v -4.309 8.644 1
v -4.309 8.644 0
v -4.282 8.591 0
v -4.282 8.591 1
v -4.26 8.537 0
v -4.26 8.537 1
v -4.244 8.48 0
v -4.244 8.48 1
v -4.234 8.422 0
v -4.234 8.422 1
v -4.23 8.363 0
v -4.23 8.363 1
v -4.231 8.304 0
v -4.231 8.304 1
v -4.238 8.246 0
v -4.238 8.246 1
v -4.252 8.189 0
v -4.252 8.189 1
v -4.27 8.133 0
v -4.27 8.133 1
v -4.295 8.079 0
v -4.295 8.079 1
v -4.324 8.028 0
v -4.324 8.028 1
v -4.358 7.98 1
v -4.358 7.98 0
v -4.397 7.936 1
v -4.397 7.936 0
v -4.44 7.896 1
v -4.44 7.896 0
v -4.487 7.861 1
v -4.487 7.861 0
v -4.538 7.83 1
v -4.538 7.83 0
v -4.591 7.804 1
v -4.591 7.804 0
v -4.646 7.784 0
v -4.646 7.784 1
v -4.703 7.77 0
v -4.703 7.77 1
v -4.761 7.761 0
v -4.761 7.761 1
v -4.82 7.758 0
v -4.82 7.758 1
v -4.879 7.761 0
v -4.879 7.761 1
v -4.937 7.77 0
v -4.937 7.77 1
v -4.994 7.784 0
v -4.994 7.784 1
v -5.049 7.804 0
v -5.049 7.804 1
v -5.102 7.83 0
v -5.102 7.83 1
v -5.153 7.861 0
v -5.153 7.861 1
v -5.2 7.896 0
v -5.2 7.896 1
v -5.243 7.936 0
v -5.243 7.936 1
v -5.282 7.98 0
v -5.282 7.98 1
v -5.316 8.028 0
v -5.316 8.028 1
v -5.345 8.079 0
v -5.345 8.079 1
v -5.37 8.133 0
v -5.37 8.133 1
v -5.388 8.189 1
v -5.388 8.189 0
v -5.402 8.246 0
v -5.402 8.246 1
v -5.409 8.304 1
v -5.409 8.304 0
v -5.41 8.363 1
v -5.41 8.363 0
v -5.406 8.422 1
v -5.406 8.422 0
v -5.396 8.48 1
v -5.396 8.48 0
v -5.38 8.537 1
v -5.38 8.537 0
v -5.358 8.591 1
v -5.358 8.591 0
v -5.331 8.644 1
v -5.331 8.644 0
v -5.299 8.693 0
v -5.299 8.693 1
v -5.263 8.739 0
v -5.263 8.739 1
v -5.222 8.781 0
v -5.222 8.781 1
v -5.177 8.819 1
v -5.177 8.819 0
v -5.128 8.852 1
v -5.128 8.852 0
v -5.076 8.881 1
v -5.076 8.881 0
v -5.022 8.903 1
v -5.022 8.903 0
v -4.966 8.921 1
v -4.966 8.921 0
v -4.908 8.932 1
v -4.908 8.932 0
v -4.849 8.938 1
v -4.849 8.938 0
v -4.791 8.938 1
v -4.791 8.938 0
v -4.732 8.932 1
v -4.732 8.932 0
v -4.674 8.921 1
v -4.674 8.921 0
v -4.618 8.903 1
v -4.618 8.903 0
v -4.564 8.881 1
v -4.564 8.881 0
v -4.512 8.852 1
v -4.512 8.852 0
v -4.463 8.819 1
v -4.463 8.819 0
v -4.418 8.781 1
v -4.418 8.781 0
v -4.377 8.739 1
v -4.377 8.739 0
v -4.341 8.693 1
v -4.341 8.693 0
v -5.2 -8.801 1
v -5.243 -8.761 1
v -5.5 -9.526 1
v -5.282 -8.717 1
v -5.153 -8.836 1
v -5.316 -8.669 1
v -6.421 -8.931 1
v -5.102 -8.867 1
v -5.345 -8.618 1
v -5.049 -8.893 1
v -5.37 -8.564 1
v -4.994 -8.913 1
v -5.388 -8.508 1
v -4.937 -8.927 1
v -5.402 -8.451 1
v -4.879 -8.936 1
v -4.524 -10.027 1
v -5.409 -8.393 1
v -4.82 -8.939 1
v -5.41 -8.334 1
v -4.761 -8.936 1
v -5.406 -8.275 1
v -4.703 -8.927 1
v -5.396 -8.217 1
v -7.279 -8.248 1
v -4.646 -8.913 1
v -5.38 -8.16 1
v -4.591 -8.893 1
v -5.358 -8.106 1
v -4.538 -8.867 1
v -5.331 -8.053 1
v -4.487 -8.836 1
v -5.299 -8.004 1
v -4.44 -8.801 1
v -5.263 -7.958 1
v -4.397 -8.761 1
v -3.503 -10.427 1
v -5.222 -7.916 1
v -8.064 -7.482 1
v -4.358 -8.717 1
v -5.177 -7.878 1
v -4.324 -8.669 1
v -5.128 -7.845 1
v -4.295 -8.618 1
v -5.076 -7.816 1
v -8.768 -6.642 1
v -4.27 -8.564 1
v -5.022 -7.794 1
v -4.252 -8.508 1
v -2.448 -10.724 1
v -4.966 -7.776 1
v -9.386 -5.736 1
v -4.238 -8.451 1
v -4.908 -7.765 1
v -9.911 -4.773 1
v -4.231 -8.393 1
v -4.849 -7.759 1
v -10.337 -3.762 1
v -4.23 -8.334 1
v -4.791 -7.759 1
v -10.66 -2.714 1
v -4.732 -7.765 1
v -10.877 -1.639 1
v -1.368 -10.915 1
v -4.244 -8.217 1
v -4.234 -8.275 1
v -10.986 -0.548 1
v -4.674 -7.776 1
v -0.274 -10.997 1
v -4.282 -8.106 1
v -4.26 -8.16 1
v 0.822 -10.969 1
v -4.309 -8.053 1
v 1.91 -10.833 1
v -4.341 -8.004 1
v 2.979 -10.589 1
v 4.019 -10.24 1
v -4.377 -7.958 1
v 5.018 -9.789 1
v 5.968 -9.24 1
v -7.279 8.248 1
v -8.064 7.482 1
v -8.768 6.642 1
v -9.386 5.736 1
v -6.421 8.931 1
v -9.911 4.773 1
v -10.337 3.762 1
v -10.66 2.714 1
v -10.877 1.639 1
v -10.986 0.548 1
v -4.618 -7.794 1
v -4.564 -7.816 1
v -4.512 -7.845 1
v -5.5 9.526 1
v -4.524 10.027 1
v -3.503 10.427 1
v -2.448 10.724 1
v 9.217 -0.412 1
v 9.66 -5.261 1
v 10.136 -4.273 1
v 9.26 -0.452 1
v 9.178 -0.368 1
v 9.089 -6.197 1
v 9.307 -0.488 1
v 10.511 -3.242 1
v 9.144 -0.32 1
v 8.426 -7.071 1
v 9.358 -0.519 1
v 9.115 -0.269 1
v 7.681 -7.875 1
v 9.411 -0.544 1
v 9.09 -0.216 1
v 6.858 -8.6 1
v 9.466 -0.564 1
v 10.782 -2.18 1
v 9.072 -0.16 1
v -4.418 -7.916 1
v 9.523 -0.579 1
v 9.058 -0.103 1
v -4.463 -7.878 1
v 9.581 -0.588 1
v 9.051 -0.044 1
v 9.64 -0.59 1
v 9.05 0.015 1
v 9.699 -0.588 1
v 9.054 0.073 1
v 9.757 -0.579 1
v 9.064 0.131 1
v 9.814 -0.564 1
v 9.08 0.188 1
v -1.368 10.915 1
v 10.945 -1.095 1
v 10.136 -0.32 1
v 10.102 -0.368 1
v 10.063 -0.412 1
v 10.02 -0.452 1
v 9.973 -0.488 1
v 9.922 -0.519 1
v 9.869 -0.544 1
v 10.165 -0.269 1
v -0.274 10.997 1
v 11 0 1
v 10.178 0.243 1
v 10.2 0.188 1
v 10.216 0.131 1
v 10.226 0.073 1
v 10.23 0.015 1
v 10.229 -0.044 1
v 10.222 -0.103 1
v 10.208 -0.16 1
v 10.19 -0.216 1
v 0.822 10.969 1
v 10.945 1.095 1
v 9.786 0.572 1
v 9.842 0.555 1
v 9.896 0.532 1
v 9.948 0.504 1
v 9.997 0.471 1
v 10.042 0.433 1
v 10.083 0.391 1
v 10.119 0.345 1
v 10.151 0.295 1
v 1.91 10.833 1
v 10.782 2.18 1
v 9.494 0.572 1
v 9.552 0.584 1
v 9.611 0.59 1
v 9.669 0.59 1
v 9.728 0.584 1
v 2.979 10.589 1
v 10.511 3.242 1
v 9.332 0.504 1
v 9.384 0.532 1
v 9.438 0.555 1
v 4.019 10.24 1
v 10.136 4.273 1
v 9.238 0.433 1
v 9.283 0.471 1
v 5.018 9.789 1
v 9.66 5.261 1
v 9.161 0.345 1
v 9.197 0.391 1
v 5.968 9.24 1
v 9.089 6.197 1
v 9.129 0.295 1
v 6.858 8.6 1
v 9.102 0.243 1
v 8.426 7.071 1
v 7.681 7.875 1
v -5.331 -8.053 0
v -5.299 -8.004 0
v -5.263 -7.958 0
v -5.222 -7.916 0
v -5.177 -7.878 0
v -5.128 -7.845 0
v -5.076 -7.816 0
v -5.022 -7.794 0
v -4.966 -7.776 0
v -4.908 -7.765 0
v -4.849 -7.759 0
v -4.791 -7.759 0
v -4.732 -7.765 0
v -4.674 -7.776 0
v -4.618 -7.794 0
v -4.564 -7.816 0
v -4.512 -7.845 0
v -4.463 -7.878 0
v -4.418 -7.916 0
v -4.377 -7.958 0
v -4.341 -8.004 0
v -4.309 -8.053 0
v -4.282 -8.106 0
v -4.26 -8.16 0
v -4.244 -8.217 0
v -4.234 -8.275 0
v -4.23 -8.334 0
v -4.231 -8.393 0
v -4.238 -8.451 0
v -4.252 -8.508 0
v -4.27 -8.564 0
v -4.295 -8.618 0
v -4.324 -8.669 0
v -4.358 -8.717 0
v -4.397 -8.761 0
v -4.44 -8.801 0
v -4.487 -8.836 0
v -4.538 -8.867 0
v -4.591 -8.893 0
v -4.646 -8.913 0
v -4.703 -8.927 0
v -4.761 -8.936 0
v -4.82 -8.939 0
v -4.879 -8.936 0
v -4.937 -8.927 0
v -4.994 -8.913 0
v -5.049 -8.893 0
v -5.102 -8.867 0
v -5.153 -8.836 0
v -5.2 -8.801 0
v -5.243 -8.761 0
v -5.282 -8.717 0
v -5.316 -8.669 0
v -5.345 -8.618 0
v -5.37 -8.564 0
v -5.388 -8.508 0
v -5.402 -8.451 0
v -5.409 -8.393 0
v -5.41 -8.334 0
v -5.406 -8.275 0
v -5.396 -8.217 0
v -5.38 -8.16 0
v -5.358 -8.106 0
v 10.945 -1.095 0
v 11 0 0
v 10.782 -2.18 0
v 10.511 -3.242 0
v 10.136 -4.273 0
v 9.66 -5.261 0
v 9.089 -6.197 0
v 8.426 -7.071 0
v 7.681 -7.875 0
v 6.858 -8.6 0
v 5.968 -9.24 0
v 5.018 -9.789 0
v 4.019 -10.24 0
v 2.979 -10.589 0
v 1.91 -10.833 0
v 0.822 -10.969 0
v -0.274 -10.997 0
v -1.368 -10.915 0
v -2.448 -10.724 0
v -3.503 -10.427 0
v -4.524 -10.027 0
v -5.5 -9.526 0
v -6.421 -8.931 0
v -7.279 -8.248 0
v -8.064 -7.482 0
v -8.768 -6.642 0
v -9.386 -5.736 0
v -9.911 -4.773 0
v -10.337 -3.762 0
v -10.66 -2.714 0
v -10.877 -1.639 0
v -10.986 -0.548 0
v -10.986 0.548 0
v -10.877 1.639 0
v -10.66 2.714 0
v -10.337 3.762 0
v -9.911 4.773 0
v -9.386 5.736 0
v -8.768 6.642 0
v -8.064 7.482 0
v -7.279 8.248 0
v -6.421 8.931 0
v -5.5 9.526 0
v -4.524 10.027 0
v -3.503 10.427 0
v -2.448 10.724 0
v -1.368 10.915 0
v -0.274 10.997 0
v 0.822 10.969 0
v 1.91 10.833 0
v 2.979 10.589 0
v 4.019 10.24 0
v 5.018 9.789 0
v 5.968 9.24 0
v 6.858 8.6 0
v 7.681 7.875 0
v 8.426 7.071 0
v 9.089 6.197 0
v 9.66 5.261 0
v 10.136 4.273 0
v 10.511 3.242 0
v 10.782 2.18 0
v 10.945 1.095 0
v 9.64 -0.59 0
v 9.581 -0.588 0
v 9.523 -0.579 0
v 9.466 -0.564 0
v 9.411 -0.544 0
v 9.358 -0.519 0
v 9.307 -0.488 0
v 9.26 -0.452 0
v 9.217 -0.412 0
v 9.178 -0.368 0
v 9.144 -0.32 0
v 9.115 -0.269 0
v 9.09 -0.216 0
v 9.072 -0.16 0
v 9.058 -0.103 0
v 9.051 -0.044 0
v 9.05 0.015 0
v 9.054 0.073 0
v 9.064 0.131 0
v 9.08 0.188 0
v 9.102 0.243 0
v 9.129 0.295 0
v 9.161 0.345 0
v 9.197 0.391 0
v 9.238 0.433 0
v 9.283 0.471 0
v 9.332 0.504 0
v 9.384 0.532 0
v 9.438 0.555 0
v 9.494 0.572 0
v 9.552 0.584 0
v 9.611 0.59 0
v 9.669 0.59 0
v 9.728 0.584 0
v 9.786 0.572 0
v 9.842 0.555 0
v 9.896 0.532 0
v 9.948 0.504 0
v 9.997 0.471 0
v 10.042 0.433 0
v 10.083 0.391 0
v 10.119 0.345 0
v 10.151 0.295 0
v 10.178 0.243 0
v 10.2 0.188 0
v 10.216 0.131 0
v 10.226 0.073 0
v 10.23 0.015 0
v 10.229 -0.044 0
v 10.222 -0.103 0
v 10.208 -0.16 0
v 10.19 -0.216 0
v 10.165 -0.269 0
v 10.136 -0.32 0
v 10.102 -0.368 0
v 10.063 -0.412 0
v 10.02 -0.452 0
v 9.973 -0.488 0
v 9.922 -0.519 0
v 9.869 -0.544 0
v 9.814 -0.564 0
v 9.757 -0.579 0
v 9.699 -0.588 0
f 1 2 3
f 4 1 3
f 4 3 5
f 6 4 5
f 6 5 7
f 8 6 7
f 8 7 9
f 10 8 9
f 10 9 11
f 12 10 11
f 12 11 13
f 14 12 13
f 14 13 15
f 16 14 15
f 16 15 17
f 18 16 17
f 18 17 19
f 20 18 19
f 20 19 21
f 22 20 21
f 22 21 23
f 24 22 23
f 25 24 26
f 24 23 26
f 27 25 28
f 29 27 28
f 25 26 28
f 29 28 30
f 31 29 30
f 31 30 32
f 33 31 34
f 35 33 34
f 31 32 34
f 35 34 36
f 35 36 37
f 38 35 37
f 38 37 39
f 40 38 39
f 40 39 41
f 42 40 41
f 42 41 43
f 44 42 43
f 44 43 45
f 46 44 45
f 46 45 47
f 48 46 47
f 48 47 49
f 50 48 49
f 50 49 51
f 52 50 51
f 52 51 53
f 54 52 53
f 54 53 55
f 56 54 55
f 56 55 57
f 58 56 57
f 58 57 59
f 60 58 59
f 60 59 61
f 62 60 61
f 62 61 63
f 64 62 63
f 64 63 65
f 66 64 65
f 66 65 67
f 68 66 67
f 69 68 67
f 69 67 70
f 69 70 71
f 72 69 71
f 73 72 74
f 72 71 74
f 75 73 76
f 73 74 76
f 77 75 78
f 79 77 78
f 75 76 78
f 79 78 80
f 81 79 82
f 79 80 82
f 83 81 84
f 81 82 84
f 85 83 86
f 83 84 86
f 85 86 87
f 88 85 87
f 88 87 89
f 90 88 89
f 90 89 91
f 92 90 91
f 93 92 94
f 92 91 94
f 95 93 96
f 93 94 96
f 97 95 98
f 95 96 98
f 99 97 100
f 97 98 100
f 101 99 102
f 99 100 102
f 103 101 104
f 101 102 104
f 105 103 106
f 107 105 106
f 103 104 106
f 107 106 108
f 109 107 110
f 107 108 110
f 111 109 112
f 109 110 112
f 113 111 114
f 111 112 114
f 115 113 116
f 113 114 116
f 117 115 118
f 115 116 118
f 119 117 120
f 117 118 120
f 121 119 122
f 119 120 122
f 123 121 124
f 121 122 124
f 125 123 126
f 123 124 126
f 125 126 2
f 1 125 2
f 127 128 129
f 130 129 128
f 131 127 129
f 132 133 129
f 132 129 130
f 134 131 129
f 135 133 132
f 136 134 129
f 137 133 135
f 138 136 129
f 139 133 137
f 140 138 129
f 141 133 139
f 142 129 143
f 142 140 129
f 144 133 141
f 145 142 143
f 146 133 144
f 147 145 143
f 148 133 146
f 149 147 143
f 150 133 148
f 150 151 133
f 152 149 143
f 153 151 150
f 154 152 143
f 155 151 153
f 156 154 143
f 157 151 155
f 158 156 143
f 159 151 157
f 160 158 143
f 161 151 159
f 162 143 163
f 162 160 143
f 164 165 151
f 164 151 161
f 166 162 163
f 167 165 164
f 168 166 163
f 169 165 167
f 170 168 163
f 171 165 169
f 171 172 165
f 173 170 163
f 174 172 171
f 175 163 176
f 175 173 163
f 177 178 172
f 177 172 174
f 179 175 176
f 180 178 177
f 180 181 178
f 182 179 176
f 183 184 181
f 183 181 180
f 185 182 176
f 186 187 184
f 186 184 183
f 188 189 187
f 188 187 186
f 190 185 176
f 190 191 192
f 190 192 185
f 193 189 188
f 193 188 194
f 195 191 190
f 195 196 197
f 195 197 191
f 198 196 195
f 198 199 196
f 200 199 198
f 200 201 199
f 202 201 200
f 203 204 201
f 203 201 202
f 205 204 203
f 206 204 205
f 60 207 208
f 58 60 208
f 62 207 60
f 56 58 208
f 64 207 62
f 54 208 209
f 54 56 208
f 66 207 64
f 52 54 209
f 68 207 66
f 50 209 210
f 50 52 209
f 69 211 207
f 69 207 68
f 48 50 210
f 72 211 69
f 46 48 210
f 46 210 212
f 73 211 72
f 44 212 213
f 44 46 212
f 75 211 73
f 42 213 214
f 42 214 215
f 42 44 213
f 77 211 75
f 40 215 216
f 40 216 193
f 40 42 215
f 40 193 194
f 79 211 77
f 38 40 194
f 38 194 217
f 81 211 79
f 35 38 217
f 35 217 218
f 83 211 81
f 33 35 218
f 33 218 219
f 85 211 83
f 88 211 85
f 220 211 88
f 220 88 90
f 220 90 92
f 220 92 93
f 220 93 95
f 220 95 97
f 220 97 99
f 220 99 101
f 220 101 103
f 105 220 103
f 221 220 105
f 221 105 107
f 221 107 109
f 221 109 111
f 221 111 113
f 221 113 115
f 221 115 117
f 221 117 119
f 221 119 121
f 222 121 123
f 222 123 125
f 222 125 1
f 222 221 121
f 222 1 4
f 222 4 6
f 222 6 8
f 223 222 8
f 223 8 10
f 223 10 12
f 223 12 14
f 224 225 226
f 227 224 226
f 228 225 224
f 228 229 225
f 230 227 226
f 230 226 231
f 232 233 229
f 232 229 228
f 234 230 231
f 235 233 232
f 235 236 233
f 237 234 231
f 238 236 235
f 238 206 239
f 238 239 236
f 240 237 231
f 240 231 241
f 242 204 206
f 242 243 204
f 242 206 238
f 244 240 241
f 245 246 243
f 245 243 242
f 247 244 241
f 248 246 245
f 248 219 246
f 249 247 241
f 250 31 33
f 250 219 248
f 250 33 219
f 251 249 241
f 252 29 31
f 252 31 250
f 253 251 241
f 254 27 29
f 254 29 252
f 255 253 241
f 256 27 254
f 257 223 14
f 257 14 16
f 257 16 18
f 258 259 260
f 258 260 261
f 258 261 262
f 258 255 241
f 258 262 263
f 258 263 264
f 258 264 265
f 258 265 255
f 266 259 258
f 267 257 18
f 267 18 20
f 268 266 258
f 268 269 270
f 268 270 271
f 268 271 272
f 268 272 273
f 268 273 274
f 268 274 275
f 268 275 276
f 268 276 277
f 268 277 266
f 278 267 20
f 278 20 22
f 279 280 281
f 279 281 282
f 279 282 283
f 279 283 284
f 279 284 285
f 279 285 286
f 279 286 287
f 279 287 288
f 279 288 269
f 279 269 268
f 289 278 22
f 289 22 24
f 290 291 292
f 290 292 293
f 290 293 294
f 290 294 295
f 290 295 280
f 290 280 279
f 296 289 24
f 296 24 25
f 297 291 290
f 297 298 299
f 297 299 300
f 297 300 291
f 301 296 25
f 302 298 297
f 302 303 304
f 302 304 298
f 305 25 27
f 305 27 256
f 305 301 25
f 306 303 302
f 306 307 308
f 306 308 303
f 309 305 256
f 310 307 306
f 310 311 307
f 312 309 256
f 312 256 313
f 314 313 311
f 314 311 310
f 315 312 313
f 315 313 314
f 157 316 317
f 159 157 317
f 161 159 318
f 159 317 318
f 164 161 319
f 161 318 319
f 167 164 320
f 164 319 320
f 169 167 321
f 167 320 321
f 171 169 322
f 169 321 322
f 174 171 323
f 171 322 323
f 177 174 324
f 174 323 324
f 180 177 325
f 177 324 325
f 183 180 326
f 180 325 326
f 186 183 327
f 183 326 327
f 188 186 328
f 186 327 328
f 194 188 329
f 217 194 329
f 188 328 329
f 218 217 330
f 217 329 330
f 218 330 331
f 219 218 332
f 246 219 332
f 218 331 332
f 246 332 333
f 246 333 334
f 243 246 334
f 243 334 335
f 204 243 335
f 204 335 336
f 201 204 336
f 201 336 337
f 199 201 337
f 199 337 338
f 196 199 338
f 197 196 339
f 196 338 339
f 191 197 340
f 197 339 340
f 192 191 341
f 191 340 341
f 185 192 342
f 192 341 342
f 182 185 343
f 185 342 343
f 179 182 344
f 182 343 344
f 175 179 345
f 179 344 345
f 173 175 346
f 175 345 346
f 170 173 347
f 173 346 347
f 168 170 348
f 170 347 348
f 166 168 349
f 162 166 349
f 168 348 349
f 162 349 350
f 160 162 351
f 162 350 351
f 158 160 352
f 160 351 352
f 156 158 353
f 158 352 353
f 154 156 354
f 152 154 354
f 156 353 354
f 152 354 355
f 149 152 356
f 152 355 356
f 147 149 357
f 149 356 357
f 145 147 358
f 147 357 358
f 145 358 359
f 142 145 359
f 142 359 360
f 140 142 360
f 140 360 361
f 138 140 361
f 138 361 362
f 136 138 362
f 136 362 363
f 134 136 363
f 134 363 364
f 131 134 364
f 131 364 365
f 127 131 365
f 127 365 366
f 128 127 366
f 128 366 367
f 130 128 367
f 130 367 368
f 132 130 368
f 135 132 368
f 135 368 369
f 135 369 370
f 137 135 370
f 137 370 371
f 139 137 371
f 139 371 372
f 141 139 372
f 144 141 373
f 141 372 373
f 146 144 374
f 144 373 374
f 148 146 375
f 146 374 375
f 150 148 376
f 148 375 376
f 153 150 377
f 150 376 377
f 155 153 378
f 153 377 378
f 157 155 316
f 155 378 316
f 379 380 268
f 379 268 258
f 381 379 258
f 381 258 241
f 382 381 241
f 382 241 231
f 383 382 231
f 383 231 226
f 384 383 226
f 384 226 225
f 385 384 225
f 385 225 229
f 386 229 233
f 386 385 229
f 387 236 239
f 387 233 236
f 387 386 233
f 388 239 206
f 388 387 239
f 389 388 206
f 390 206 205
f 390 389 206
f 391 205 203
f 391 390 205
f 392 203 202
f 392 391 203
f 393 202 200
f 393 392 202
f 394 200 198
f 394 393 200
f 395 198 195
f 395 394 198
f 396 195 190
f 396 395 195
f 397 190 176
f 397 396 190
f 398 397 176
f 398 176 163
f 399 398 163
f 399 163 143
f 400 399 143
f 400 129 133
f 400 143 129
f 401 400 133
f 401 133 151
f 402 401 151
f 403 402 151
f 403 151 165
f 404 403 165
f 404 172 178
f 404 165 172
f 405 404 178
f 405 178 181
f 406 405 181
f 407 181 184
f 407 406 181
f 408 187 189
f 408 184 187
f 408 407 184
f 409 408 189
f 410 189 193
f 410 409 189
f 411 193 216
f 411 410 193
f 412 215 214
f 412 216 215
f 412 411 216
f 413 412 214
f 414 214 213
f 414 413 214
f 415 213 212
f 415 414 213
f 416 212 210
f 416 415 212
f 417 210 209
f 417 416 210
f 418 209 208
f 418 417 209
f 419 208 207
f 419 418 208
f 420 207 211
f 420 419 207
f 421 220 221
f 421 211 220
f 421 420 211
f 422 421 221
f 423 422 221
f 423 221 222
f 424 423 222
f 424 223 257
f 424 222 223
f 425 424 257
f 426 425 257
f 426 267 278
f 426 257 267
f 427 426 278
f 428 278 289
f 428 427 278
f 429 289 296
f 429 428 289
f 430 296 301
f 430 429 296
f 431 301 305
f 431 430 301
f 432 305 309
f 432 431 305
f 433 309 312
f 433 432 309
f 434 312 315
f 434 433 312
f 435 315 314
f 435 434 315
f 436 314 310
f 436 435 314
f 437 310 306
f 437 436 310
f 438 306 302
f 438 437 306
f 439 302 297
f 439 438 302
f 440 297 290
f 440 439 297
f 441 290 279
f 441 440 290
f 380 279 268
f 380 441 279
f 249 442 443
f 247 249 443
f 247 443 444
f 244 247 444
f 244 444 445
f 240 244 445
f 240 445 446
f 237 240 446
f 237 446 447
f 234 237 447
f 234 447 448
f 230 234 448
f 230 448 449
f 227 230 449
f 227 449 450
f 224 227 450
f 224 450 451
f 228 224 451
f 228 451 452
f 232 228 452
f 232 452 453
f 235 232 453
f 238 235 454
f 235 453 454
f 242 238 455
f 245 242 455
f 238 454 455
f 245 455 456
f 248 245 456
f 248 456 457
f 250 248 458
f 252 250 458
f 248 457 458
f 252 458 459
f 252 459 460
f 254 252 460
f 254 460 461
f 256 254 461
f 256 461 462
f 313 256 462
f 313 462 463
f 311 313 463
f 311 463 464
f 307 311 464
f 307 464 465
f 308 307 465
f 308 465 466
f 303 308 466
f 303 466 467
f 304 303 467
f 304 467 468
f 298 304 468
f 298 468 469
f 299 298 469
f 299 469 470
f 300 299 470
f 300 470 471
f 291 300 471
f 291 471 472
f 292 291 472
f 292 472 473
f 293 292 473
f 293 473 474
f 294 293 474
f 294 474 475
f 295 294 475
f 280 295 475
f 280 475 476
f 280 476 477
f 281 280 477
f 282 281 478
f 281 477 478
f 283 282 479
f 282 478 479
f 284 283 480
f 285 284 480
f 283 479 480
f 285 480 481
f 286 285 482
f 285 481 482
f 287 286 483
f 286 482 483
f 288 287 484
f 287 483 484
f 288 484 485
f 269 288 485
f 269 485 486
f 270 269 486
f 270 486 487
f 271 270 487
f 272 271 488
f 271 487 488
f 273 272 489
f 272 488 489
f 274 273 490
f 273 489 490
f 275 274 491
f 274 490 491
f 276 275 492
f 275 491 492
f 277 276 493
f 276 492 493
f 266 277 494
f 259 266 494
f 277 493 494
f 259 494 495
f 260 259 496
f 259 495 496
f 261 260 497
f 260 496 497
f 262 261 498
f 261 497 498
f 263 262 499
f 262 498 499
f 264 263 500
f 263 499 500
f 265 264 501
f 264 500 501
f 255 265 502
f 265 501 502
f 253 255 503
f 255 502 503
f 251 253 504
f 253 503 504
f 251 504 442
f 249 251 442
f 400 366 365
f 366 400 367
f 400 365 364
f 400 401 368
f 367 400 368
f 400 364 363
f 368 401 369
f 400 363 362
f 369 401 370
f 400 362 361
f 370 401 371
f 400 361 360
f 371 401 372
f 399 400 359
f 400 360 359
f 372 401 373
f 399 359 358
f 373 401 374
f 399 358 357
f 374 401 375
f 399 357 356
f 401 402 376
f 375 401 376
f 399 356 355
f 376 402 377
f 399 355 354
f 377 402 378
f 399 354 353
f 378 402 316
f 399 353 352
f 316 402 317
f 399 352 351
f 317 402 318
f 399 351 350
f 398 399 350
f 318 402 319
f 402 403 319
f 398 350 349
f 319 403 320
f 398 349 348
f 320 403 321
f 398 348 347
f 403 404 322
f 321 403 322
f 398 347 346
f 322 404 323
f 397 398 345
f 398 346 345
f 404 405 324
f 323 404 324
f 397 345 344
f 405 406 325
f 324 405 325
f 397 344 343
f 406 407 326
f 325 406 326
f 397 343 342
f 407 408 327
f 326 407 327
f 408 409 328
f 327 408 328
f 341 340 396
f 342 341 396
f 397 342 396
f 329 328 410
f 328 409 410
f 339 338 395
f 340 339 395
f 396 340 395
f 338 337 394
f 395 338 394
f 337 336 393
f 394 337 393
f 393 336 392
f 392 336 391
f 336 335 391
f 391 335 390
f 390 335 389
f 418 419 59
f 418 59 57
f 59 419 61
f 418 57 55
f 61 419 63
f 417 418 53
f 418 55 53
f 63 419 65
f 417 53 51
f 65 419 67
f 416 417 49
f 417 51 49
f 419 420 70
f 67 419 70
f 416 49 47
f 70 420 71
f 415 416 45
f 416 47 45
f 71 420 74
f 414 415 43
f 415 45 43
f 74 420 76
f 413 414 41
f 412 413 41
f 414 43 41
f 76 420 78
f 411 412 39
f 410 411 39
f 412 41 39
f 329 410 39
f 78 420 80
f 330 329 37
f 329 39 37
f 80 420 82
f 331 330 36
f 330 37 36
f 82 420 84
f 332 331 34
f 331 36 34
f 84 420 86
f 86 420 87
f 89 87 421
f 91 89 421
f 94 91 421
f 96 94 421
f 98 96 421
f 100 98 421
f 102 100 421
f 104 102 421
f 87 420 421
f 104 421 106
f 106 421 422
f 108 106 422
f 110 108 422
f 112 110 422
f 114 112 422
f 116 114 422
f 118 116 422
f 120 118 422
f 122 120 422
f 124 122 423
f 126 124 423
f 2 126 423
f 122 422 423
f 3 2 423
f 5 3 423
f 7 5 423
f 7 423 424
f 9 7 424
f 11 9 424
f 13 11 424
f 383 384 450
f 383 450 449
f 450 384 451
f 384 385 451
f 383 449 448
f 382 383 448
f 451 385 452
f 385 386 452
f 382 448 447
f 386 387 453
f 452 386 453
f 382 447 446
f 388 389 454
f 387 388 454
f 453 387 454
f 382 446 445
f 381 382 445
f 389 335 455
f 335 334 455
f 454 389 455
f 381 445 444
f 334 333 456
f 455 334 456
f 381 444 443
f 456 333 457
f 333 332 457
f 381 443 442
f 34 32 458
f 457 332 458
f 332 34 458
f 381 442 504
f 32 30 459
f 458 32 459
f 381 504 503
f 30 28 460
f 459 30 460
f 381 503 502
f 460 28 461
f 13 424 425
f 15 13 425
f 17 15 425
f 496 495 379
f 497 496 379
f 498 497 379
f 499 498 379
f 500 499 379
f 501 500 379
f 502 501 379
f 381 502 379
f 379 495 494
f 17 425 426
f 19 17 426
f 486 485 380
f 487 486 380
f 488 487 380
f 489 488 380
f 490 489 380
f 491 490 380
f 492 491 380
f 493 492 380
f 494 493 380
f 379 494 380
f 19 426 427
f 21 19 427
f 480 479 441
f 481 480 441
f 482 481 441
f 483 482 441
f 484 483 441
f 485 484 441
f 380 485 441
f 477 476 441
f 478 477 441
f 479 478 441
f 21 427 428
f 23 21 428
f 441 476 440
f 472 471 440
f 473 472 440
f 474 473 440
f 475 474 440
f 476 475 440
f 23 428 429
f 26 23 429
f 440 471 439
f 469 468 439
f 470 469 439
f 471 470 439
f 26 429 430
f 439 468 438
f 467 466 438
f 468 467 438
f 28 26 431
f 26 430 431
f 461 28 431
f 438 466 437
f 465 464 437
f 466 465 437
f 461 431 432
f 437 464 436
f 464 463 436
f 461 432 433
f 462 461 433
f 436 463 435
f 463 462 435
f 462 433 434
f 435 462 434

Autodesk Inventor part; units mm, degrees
ref_plane "YZ Plane" through (0, 0, 0) normal (1, 0, 0) x (0, 1, 0)
ref_plane "XZ Plane" through (0, 0, 0) normal (0, 1, 0) x (-1, 0, 0)
ref_plane "XY Plane" through (0, 0, 0) normal (0, 0, 1) x (1, 0, 0)
sketch "Sketch1" plane through (0, 0, 0) normal (0, 0, 1) x (1, 0, 0)
  circle A0 centre (0, 0) radius 11
  dimension "d0" = 22
extrude "Extrusion1" add sketch "Sketch1" along normal blind 1
sketch "Sketch2" plane through (0, 0, 1) normal (0, 0, 1) x (1, 0, 0)
  circle A0 centre (0, 0) radius 11 projected
  point P0 (9.64, 0)
  dimension "d3" = 9.64
hole "Hole1" at (9.64, 0, 1) direction (0, 0, -1) diameter 1.181 depth 8 thread size "0-80 UNF" class "2B" standard "ANSI Unified Screw Threads"
pattern_circular "Circular Pattern1" count 3 over 360 about axis through (0, 0, -10) along (0, 0, 1) of "Hole1"
properties part number "Electronics"
